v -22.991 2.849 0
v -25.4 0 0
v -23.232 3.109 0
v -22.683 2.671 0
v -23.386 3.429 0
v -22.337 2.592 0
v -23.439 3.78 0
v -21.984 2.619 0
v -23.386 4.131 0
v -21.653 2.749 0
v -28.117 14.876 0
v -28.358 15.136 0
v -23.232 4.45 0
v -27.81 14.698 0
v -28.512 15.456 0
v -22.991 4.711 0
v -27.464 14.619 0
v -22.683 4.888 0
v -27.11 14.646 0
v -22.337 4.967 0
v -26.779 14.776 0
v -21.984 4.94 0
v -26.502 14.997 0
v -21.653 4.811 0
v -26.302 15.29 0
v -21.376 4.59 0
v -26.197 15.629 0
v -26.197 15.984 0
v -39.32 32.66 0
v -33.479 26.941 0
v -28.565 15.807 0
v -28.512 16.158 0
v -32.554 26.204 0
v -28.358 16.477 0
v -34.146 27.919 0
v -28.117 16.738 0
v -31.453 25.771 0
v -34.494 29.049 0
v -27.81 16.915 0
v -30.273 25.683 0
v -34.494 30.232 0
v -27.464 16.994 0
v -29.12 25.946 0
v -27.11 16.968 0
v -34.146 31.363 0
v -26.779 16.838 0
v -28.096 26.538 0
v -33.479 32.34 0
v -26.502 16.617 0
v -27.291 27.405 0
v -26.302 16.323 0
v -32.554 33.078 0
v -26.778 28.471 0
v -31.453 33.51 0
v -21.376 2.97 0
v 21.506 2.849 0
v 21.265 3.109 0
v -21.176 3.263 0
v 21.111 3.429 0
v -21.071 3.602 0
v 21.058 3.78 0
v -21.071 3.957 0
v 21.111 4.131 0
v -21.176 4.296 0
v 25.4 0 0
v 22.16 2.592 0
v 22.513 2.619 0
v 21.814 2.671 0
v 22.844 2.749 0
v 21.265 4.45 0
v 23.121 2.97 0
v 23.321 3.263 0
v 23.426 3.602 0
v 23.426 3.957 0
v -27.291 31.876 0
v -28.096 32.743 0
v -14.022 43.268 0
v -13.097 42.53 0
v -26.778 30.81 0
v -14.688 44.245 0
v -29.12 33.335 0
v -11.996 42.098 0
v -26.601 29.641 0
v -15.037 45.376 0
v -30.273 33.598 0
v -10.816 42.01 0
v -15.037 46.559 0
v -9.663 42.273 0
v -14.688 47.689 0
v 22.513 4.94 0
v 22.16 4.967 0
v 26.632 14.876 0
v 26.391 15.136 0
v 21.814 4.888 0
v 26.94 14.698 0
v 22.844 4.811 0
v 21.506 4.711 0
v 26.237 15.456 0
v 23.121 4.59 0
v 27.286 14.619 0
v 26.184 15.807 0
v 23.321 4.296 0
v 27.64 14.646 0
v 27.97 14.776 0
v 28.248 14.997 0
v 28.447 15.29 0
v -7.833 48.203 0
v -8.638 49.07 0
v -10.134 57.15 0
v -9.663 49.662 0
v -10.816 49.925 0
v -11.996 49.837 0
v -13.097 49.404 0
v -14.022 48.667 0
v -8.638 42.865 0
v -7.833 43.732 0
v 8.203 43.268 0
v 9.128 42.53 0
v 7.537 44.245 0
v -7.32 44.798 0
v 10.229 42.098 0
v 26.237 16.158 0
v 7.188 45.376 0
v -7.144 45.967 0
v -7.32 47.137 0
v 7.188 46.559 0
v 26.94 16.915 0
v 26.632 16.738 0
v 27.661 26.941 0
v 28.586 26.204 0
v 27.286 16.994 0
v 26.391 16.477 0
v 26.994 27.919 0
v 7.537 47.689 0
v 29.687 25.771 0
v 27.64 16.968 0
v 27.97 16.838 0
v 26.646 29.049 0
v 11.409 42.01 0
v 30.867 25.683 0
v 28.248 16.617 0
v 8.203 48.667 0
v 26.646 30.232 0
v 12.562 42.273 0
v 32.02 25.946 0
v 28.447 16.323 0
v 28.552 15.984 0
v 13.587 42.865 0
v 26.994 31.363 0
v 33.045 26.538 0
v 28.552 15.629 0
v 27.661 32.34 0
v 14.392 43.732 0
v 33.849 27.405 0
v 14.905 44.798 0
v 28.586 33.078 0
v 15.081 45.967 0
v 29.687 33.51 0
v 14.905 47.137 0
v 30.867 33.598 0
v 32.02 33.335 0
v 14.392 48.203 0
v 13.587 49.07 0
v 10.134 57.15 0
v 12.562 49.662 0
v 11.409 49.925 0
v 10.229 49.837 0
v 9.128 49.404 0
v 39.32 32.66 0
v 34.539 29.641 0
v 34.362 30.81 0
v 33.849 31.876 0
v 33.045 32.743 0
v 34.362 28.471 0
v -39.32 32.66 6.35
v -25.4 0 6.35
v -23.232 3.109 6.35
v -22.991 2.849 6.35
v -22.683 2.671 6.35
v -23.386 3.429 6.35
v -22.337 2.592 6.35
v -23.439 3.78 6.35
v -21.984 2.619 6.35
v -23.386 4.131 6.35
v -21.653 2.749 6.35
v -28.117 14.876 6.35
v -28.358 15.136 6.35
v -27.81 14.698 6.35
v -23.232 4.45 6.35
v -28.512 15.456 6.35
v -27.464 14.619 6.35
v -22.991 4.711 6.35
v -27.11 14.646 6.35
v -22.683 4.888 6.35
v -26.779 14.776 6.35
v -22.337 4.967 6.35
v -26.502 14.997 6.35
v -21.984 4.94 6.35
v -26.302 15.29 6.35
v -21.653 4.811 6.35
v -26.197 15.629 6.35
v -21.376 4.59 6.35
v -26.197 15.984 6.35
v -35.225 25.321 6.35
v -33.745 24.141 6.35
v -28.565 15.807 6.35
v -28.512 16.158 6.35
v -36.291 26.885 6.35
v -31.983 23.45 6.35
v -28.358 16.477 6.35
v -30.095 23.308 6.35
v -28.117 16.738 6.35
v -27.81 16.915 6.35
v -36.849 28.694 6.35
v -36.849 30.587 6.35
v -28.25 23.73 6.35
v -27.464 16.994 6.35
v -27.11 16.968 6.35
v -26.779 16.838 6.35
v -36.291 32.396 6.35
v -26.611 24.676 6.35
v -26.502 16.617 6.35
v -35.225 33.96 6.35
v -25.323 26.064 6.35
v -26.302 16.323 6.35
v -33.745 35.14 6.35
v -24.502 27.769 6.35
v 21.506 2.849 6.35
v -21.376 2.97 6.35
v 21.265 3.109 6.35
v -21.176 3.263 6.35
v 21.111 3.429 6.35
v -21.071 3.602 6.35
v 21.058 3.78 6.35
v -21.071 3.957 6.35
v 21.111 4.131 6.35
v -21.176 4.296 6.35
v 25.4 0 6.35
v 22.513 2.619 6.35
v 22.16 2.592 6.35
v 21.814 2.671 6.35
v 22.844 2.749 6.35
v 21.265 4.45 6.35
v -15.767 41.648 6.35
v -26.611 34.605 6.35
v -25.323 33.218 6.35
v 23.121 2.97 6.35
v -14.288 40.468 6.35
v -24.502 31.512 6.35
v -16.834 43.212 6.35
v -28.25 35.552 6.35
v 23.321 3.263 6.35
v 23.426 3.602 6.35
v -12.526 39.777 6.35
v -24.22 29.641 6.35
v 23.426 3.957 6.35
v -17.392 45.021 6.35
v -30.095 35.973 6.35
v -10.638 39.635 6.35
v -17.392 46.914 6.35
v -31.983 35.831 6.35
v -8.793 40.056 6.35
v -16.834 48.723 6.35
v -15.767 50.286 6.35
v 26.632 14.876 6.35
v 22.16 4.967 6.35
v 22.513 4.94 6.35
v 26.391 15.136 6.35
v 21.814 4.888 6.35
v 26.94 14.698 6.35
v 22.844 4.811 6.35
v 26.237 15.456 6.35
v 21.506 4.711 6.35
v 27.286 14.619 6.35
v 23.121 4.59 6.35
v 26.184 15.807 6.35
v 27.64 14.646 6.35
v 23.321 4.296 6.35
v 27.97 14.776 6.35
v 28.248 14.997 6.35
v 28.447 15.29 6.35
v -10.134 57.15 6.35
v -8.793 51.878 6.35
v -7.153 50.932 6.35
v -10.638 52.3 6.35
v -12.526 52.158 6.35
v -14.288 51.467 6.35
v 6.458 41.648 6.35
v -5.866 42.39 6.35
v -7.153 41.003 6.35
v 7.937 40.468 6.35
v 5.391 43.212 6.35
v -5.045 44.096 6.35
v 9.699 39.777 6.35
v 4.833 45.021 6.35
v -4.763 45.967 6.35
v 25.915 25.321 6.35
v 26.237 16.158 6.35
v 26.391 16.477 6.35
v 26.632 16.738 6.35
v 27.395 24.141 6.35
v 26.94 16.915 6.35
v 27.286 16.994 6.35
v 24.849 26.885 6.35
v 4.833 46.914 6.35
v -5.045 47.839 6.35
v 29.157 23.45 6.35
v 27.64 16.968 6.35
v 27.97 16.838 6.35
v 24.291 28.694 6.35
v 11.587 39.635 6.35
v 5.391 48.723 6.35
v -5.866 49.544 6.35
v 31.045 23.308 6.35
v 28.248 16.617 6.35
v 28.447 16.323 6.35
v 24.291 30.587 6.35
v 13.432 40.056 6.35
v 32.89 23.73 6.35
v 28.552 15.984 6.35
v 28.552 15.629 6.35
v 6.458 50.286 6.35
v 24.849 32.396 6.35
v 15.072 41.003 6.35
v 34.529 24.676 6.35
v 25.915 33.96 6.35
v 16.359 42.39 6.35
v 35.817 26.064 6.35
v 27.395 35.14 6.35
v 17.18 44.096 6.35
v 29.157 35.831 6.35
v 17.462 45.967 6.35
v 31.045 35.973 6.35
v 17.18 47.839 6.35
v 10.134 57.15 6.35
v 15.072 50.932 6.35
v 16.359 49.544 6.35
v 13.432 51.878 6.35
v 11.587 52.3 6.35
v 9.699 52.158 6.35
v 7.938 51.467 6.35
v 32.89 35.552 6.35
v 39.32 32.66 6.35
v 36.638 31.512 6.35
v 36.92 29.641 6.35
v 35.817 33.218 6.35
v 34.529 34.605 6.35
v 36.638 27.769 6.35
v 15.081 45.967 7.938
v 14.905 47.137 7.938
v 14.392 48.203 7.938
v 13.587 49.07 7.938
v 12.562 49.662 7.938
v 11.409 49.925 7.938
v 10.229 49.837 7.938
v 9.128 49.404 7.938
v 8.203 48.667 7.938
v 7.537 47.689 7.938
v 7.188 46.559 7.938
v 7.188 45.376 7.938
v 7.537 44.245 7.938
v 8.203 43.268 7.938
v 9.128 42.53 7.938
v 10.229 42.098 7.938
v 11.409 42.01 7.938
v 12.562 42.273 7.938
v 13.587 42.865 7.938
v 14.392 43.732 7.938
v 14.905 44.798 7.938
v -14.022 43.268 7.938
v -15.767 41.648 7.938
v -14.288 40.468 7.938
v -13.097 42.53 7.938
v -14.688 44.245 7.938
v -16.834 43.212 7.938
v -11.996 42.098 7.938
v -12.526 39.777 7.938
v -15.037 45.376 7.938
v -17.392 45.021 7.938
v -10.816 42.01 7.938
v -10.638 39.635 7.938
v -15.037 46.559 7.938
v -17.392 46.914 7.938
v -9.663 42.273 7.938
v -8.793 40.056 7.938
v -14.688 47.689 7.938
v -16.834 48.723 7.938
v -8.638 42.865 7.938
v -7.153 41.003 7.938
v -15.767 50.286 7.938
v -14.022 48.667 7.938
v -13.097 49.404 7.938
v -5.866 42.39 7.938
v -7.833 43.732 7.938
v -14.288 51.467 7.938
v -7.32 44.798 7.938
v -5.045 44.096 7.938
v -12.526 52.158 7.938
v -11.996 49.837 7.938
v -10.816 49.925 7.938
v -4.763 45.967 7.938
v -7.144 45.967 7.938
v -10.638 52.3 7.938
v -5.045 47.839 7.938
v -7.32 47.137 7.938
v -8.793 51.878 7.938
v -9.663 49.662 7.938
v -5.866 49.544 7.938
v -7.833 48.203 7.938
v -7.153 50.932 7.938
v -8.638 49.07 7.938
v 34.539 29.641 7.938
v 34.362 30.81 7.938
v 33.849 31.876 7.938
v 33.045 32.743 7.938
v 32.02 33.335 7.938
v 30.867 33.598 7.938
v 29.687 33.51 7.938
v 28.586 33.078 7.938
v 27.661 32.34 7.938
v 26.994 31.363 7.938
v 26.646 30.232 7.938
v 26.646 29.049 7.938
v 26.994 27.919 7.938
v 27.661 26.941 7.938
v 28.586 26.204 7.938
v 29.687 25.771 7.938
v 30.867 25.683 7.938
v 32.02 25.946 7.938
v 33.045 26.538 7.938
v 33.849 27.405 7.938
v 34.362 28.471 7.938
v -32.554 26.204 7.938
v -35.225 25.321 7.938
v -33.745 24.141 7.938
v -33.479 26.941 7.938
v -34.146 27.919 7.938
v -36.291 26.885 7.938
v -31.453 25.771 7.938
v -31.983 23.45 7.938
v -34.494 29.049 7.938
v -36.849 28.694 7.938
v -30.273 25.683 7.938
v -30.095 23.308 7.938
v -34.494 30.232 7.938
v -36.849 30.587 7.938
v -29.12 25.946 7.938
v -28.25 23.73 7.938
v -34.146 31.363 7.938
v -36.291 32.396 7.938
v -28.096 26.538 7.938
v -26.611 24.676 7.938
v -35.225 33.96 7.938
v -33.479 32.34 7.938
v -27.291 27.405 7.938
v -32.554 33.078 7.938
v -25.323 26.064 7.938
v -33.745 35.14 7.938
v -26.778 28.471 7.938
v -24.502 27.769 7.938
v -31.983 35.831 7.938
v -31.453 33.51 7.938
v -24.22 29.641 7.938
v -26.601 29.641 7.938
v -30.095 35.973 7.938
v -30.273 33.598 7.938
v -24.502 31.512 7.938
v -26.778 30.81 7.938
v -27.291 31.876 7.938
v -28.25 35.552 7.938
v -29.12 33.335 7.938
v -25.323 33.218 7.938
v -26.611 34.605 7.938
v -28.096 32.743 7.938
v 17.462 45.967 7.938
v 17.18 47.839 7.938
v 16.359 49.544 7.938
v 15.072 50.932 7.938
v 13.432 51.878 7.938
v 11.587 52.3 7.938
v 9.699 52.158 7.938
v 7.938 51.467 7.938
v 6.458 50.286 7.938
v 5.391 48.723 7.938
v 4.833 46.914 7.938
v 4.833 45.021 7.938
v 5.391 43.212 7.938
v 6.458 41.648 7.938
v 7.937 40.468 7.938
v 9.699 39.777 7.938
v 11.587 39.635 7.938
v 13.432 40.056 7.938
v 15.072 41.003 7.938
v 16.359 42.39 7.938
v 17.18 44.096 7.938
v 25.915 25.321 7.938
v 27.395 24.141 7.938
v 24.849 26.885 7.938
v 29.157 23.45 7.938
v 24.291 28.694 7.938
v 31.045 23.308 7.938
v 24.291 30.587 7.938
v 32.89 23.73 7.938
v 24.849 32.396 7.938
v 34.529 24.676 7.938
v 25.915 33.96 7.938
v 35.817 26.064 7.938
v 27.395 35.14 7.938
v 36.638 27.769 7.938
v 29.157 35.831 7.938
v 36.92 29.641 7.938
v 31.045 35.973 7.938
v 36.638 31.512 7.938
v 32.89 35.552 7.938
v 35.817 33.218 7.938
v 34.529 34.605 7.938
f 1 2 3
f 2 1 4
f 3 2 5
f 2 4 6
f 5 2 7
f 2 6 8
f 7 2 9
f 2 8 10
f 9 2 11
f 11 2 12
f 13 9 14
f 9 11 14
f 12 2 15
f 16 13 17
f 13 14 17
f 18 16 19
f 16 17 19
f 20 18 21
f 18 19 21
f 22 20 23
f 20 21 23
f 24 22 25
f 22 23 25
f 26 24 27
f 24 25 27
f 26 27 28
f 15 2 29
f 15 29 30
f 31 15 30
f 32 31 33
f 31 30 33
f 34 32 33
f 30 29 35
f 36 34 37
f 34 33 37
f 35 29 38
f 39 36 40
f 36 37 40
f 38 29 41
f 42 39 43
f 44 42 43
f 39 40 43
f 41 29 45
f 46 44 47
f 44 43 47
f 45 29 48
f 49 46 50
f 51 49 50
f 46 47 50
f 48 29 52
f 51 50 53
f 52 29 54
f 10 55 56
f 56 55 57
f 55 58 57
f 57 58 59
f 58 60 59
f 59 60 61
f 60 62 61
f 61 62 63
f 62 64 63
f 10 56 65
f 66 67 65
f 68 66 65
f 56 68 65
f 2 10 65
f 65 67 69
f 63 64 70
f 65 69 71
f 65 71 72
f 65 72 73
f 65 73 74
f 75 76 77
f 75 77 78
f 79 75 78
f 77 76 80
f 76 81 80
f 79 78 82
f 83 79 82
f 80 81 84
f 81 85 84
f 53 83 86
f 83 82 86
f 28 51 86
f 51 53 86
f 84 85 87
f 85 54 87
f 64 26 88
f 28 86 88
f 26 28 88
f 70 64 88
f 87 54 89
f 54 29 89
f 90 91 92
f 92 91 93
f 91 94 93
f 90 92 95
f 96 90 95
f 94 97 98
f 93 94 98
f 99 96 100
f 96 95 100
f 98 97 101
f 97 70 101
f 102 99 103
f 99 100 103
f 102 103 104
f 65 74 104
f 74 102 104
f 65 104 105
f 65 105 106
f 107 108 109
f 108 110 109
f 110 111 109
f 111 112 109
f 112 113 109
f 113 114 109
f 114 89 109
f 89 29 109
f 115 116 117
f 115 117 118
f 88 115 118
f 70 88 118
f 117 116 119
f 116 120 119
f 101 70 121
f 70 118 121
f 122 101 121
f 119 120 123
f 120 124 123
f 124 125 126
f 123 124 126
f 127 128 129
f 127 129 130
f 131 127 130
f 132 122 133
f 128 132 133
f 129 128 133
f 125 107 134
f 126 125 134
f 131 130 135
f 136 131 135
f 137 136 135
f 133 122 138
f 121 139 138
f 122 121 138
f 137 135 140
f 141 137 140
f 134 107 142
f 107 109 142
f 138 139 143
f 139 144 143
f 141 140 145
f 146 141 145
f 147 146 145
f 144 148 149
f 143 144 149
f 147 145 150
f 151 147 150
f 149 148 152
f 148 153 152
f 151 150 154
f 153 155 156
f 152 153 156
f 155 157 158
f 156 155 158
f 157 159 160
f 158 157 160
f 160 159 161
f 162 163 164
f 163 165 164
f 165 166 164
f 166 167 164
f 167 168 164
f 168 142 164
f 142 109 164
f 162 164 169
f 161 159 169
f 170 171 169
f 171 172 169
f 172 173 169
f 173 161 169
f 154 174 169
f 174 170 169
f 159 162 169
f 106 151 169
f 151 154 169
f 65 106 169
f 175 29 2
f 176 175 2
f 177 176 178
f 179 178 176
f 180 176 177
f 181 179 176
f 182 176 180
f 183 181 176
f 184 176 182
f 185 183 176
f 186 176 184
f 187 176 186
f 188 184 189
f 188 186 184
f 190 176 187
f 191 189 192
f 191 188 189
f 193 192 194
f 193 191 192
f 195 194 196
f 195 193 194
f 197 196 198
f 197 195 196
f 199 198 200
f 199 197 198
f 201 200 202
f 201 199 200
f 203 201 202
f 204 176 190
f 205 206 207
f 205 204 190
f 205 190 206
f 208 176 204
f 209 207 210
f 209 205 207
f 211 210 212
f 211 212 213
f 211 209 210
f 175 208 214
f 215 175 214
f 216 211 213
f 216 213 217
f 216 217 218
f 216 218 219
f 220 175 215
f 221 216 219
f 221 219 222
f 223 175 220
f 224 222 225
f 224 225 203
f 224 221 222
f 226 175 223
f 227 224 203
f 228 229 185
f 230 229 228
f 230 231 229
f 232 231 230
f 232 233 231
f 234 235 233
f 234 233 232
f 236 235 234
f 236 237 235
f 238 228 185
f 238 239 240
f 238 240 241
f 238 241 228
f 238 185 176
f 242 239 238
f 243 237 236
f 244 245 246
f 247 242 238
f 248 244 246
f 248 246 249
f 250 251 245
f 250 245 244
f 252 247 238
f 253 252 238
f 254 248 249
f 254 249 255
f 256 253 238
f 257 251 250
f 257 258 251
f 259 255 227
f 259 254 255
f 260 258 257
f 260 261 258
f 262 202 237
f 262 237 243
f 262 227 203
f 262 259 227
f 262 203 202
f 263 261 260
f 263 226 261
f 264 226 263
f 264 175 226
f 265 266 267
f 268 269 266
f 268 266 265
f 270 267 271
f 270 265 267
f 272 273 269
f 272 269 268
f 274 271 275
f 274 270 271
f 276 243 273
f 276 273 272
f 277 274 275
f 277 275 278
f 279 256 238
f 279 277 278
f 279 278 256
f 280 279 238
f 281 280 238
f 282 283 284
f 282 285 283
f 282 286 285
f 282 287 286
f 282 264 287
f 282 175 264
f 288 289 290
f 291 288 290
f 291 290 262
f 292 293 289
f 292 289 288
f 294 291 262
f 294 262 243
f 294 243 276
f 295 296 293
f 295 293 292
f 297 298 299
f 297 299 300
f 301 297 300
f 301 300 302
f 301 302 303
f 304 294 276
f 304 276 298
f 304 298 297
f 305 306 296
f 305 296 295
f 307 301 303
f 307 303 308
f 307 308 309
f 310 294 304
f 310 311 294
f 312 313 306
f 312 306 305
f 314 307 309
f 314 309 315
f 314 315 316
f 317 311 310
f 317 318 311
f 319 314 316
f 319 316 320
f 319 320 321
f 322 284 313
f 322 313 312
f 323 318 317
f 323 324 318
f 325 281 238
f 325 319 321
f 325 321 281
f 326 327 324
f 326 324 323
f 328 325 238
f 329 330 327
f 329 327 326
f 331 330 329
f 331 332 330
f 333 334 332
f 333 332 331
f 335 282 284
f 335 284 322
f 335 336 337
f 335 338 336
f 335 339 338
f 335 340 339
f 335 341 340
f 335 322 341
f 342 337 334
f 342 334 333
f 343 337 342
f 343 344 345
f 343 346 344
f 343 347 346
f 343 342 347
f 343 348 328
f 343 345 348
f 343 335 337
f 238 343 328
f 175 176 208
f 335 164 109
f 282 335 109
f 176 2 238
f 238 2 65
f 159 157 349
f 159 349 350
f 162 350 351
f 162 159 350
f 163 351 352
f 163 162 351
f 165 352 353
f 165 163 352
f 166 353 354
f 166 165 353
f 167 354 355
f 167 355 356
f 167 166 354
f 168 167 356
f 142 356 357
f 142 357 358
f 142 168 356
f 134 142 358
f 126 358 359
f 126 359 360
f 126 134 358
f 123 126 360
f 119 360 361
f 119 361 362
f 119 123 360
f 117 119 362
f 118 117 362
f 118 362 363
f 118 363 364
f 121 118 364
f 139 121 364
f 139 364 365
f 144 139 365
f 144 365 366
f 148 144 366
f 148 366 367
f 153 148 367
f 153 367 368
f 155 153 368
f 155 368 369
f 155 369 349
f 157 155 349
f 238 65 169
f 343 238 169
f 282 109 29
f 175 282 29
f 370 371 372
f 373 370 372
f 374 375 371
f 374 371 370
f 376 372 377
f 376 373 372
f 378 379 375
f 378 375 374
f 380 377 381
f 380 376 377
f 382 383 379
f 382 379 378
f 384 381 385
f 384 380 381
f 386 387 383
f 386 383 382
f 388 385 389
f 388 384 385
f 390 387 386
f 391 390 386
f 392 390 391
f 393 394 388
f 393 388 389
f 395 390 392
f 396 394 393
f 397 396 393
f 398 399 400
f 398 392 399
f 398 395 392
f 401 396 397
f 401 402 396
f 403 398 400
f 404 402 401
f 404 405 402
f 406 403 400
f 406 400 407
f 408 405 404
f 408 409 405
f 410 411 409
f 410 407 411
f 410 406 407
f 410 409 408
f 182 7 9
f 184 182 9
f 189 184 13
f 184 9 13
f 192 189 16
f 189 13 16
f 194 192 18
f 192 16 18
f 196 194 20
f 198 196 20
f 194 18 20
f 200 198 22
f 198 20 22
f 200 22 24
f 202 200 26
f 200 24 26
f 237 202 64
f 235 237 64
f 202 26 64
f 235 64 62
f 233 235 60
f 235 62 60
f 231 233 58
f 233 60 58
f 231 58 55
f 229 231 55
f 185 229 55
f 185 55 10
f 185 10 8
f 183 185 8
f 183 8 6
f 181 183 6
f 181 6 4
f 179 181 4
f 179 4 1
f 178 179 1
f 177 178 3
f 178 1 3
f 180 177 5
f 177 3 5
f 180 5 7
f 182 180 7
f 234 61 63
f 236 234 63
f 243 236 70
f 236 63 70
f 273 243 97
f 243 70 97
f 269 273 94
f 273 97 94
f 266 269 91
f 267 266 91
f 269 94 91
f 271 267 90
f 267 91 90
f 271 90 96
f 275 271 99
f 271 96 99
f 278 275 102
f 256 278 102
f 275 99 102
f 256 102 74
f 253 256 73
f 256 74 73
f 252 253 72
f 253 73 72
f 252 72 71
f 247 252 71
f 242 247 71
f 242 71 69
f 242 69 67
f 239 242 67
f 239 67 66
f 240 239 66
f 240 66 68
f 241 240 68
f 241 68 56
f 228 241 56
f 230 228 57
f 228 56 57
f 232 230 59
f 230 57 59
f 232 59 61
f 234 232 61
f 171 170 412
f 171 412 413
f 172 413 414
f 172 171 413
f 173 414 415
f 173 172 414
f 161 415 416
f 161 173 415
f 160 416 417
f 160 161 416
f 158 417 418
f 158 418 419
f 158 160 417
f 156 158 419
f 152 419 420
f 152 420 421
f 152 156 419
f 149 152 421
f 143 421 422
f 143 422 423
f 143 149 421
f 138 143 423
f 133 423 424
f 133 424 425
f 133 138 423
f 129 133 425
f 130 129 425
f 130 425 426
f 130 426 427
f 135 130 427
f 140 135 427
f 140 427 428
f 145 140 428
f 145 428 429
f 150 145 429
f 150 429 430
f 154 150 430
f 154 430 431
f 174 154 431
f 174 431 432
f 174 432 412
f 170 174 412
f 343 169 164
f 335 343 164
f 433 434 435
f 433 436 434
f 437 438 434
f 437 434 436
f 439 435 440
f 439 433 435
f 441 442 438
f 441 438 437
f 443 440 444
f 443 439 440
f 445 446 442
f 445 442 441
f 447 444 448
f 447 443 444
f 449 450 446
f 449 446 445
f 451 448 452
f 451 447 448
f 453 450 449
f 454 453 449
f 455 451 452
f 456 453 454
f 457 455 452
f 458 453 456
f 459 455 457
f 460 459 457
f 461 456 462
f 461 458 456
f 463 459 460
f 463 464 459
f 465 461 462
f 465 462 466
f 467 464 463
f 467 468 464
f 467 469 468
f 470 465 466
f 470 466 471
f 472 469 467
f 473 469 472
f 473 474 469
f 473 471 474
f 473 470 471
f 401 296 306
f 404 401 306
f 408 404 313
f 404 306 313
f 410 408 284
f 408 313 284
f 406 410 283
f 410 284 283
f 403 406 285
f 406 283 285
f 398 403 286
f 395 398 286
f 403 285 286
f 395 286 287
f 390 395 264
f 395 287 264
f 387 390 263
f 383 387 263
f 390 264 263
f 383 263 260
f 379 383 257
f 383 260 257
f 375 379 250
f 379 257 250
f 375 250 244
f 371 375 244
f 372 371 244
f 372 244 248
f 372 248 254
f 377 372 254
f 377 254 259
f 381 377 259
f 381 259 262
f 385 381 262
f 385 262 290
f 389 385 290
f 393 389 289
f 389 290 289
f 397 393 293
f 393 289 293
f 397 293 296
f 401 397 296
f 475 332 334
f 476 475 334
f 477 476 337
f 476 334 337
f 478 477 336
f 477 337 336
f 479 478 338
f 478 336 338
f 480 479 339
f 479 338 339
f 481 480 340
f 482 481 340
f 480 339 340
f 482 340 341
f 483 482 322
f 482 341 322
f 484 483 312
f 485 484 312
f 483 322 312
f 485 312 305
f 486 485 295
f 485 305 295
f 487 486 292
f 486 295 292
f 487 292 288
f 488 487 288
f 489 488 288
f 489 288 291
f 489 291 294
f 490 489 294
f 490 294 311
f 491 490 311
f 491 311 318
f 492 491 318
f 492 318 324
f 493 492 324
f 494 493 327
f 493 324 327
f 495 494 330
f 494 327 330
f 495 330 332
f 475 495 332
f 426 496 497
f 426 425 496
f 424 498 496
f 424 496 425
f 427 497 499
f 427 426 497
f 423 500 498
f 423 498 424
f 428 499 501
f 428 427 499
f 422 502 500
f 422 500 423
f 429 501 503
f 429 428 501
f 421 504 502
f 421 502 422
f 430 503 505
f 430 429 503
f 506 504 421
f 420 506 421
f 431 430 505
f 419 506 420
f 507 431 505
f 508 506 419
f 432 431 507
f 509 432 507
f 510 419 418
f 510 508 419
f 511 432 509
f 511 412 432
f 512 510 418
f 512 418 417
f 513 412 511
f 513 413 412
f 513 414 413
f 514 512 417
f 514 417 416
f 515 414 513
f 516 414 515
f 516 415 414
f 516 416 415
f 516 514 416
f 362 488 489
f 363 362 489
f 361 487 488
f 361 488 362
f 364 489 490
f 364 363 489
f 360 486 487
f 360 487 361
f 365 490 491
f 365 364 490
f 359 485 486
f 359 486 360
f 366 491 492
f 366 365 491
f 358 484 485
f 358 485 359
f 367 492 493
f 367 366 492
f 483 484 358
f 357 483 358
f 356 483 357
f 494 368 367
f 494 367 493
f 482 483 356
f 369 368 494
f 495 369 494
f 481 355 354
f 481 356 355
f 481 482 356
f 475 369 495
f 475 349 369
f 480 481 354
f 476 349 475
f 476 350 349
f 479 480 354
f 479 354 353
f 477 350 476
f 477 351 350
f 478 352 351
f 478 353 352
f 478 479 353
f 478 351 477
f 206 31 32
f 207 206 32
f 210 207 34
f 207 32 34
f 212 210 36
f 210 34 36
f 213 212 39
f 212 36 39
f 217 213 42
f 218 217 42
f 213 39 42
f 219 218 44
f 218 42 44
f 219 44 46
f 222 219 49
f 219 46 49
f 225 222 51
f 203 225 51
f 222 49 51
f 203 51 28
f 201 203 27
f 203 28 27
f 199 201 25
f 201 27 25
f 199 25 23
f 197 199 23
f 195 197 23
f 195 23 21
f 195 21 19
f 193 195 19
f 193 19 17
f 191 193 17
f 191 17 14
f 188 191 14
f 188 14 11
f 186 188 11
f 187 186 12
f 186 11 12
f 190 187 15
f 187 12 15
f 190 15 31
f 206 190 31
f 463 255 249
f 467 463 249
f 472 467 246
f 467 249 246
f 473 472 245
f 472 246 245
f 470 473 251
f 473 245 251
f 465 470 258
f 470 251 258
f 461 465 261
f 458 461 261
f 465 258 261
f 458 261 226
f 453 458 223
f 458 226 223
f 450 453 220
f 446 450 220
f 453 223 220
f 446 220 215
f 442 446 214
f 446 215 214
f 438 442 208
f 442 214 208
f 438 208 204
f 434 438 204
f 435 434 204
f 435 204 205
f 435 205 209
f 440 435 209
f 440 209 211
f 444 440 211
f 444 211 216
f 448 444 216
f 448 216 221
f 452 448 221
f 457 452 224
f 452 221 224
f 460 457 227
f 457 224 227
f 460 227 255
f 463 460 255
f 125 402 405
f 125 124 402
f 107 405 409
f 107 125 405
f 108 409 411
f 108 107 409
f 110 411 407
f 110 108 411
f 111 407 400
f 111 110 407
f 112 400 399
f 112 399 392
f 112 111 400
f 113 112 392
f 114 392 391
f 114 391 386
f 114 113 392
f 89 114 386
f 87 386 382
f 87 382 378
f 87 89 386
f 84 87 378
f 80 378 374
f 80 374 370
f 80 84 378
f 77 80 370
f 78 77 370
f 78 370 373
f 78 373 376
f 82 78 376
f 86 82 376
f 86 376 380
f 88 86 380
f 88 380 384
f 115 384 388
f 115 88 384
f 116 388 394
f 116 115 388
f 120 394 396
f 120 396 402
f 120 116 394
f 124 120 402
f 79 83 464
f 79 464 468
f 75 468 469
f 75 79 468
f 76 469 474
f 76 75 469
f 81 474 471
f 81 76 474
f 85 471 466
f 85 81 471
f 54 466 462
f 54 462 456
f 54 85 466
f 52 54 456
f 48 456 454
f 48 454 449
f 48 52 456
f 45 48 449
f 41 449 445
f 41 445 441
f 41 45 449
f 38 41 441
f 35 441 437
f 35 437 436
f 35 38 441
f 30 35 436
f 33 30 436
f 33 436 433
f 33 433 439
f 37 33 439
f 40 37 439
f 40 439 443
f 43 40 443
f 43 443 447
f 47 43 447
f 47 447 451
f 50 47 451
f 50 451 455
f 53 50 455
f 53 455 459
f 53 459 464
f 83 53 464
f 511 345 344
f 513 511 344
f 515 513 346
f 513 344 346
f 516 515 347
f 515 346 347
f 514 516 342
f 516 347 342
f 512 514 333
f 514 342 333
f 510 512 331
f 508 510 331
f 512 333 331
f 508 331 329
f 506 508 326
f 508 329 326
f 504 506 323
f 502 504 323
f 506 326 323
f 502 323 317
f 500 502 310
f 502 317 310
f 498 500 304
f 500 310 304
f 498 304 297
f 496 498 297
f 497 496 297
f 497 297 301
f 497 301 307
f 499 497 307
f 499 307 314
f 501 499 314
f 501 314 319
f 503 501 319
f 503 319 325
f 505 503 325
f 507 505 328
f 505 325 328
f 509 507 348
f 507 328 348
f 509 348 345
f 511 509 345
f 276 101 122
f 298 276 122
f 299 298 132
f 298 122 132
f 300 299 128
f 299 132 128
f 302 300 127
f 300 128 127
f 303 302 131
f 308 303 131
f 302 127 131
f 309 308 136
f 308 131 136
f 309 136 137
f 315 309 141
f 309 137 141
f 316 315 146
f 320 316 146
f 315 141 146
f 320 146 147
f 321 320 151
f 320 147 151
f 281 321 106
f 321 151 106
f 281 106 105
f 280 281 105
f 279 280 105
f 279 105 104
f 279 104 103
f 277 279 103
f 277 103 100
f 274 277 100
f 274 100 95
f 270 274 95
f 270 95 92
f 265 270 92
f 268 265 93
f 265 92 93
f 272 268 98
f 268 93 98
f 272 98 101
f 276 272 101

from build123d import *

# Parameters (mm, degrees)
SKETCH1_R           = 3.96875
BOSS_EXTRUDE1_DEPTH = 6.35
SKETCH2_R           = 1.190625
CUT_EXTRUDE1_DEPTH  = 6.35
SKETCH3_R           = 6.35
SKETCH3_R_2         = 3.96875
BOSS_EXTRUDE2_DEPTH = 1.5875


with BuildPart() as part:
    # Sketch1 → Boss-Extrude1 (new body)
    with BuildSketch(Plane.XY):
        Polygon((-25.4, 0), (25.4, 0), (39.320442167, 32.659792071), (10.134148885, 57.15), (-10.134148885, 57.15), (-39.320442167, 32.659792071), align=None)
        with Locations((11.1125, 45.967395581)):
            Circle(SKETCH1_R, mode=Mode.SUBTRACT)
        with Locations((-11.1125, 45.967395581)):
            Circle(SKETCH1_R, mode=Mode.SUBTRACT)
        with Locations((30.570028855, 29.640590295)):
            Circle(SKETCH1_R, mode=Mode.SUBTRACT)
        with Locations((-30.570028855, 29.640590295)):
            Circle(SKETCH1_R, mode=Mode.SUBTRACT)
    extrude(amount=BOSS_EXTRUDE1_DEPTH)

    # Sketch2 → Cut-Extrude1 (cut)
    with BuildSketch(Plane(origin=(0, 0, 0), x_dir=(-1, 0, 0), z_dir=(0, 0, -1))):
        with Locations((-27.374737278, 15.806737027)):
            Circle(SKETCH2_R)
        with Locations((-22.248493734, 3.779673069)):
            Circle(SKETCH2_R)
        with Locations((22.248493734, 3.779673069)):
            Circle(SKETCH2_R)
        with Locations((27.374737278, 15.806737027)):
            Circle(SKETCH2_R)
    extrude(amount=-CUT_EXTRUDE1_DEPTH, mode=Mode.SUBTRACT)

    # Sketch3 → Boss-Extrude2 (add)
    with BuildSketch(Plane.XY.offset(6.35)):
        with Locations((-11.1125, 45.967395581)):
            Circle(SKETCH3_R)
        with Locations((-11.1125, 45.967395581)):
            Circle(SKETCH3_R_2, mode=Mode.SUBTRACT)
        with Locations((11.1125, 45.967395581)):
            Circle(SKETCH3_R)
        with Locations((11.1125, 45.967395581)):
            Circle(SKETCH3_R_2, mode=Mode.SUBTRACT)
        with Locations((-30.570028855, 29.640590295)):
            Circle(SKETCH3_R)
        with Locations((-30.570028855, 29.640590295)):
            Circle(SKETCH3_R_2, mode=Mode.SUBTRACT)
        with Locations((30.570028855, 29.640590295)):
            Circle(SKETCH3_R)
        with Locations((30.570028855, 29.640590295)):
            Circle(SKETCH3_R_2, mode=Mode.SUBTRACT)
    extrude(amount=BOSS_EXTRUDE2_DEPTH)


solid = part.part
